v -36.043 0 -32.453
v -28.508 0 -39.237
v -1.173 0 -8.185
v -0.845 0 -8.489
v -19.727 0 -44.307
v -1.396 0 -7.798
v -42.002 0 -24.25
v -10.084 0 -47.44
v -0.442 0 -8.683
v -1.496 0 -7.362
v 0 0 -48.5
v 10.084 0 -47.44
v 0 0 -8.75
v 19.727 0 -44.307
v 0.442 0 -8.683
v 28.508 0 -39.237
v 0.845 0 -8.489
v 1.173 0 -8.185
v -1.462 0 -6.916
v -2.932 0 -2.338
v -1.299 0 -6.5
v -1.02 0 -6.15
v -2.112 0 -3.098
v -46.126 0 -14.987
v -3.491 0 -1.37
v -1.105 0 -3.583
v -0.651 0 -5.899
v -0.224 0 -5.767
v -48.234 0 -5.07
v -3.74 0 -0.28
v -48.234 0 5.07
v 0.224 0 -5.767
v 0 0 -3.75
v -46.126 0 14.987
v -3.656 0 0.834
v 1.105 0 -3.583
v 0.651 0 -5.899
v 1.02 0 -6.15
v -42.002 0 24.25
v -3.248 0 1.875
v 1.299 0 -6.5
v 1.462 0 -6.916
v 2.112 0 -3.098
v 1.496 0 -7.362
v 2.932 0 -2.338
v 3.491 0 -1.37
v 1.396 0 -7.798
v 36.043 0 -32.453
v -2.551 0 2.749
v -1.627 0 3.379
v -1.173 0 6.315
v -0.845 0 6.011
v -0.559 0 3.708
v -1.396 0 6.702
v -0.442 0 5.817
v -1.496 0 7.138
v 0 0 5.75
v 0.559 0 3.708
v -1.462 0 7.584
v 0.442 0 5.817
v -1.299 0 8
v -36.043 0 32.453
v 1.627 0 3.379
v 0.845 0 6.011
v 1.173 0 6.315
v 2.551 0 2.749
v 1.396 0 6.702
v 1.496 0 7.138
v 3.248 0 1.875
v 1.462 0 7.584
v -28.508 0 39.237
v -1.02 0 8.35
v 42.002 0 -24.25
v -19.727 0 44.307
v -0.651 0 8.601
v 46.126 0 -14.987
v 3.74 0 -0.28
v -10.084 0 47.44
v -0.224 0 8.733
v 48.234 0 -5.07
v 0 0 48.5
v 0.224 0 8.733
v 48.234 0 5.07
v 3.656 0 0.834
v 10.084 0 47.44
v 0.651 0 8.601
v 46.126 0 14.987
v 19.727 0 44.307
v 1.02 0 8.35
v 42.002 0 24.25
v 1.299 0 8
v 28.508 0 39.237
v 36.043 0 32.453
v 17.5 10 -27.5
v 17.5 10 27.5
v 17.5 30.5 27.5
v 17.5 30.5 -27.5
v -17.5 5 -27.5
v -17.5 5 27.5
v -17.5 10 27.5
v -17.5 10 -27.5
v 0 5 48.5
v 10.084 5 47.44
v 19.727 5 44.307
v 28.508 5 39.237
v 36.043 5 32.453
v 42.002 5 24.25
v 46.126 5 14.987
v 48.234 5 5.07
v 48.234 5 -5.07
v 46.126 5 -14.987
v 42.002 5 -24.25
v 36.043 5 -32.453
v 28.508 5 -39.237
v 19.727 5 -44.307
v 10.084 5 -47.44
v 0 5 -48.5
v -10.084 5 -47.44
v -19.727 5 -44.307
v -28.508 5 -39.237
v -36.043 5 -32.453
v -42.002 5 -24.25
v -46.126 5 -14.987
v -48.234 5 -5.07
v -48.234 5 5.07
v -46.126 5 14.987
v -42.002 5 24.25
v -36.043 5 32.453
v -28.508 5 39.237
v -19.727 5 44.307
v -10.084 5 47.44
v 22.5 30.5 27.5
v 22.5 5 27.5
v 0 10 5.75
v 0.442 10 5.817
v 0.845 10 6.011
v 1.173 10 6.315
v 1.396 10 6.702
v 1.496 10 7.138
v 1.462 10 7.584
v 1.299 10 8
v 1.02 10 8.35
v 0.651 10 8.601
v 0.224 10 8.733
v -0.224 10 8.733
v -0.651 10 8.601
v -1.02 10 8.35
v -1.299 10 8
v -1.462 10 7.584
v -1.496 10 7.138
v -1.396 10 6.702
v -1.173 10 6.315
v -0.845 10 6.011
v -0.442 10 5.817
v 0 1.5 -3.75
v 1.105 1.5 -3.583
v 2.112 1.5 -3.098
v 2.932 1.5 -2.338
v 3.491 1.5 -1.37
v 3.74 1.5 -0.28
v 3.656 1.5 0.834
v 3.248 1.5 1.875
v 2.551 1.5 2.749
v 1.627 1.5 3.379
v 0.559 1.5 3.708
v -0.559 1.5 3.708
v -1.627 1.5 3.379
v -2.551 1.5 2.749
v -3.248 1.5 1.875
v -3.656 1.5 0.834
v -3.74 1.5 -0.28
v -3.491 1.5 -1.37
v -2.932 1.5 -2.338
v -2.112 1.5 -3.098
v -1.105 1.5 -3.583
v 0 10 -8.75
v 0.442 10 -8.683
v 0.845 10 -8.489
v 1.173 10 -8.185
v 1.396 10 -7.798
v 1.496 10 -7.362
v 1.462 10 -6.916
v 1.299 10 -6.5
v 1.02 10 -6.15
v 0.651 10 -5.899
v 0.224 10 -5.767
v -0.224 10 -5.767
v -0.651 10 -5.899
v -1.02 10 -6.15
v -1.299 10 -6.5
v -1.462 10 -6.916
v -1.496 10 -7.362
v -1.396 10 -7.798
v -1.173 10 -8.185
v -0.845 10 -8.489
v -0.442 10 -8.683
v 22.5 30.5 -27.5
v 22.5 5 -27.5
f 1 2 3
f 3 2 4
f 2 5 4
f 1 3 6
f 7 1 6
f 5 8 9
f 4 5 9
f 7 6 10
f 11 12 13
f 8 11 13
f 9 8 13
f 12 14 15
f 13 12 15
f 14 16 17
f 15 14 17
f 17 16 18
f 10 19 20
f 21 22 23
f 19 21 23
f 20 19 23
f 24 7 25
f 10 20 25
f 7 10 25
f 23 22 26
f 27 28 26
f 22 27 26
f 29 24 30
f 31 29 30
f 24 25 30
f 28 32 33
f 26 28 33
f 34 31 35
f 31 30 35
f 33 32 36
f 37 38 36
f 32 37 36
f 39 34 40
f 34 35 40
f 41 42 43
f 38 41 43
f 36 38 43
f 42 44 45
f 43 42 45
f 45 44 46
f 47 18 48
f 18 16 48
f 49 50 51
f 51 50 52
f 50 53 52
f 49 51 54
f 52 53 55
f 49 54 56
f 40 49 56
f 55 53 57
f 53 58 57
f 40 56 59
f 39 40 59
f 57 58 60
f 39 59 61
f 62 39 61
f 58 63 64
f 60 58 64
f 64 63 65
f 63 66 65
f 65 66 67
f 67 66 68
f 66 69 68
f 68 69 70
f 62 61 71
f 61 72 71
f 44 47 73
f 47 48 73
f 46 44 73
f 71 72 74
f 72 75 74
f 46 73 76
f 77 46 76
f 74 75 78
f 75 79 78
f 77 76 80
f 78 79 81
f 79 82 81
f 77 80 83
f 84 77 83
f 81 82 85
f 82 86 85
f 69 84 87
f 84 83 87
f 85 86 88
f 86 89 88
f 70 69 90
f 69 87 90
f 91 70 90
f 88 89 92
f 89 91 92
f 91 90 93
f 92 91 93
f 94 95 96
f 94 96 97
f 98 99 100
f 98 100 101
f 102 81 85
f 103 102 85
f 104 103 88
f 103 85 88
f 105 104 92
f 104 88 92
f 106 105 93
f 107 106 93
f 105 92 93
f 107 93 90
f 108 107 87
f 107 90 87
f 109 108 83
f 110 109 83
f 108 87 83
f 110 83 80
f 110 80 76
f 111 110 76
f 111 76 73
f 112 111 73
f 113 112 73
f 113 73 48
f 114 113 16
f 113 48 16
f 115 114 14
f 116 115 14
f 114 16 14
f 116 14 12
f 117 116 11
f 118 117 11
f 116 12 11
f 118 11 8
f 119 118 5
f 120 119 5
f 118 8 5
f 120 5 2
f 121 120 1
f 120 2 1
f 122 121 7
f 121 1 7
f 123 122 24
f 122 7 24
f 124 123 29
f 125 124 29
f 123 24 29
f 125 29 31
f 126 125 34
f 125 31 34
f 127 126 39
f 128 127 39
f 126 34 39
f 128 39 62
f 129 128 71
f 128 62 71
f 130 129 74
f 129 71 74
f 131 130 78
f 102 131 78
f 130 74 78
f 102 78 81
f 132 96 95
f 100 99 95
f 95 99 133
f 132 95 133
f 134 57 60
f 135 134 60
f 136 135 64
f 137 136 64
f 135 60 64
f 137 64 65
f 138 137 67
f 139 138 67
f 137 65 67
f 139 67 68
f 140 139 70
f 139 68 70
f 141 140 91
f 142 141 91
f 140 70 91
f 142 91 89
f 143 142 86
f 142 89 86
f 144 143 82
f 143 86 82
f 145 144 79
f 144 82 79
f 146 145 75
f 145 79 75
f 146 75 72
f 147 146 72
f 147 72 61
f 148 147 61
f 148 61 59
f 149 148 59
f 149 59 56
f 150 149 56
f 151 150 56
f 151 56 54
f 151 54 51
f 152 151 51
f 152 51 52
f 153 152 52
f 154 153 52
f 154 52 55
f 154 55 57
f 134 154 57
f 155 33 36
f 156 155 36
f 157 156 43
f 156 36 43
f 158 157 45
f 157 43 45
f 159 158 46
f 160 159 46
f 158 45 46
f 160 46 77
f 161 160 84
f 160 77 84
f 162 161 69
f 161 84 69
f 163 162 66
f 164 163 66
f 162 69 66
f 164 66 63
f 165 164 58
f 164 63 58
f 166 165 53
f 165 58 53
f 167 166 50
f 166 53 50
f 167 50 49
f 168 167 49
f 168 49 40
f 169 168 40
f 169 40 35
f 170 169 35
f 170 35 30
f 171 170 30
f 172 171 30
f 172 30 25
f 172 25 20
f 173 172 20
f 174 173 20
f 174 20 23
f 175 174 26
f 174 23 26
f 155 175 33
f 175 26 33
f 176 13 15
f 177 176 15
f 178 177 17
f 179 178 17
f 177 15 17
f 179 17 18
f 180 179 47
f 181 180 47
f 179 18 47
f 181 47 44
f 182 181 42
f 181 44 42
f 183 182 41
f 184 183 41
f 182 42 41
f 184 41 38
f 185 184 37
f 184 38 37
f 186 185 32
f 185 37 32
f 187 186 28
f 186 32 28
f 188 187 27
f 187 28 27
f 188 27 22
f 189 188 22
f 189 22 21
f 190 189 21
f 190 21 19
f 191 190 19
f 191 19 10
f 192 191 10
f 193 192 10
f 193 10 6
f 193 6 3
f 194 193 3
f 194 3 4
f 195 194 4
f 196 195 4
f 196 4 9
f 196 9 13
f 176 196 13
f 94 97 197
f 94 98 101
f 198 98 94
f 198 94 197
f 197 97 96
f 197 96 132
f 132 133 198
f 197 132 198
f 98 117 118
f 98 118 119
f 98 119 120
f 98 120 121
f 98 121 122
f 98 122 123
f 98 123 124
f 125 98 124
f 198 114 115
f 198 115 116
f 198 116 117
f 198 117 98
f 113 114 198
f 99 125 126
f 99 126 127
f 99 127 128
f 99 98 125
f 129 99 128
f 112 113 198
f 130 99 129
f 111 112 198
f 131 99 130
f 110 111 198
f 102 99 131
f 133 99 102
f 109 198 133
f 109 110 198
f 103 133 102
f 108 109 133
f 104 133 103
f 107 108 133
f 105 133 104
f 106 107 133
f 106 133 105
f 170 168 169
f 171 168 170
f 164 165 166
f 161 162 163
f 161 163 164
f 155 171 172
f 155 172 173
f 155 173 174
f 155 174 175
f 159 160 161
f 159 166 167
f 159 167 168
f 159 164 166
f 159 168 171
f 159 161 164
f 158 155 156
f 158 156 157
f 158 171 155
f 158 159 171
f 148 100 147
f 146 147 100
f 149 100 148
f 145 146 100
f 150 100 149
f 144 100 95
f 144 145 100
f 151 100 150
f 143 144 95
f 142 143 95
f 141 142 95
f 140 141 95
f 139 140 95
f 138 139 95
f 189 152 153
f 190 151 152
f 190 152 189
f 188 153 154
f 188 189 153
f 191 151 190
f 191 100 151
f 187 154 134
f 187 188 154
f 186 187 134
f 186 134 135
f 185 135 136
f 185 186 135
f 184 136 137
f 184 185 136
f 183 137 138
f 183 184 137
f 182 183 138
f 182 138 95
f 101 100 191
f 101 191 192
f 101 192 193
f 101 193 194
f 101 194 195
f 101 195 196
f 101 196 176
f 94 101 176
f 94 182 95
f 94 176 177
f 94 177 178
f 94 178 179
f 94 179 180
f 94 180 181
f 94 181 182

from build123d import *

# Parameters (mm, degrees)
SKETCH2_R           = 48.5
BOSS_EXTRUDE1_DEPTH = 5
SKETCH6_W           = 35
SKETCH6_H           = 55
BOSS_EXTRUDE2_DEPTH = 5
SKETCH4_R           = 1.5
CUT_EXTRUDE2_DEPTH  = 70.314500647
SKETCH5_R           = 3.75
CUT_EXTRUDE3_DEPTH  = 1.5
SKETCH7_W           = 5
SKETCH7_H           = 55
BOSS_EXTRUDE3_DEPTH = 25.5


with BuildPart() as part:
    # Sketch2 → Boss-Extrude1 (new body)
    with BuildSketch(Plane(origin=(0, 0, 0), x_dir=(1, 0, 0), z_dir=(0, 1, 0))):
        with Locations(Location((0, 0, 0), (0, 0, 270))):
            Circle(SKETCH2_R)
    extrude(amount=BOSS_EXTRUDE1_DEPTH)

    # Sketch6 → Boss-Extrude2 (add)
    with BuildSketch(Plane(origin=(0, 5, 0), x_dir=(1, 0, 0), z_dir=(0, 1, 0))):
        Rectangle(SKETCH6_W, SKETCH6_H)
    extrude(amount=BOSS_EXTRUDE2_DEPTH)

    # Sketch4 → Cut-Extrude2 (cut, through all)
    with BuildSketch(Plane.XZ):
        with Locations(Location((0, 7.25, 0), (0, 0, 270))):
            Circle(SKETCH4_R)
        with Locations(Location((0, -7.25, 0), (0, 0, 270))):
            Circle(SKETCH4_R)
    extrude(amount=-CUT_EXTRUDE2_DEPTH, mode=Mode.SUBTRACT)

    # Sketch5 → Cut-Extrude3 (cut)
    with BuildSketch(Plane.XZ):
        with Locations(Location((0, 0, 0), (0, 0, 270))):
            Circle(SKETCH5_R)
    extrude(amount=-CUT_EXTRUDE3_DEPTH, mode=Mode.SUBTRACT)

    # Sketch7 → Boss-Extrude3 (add)
    with BuildSketch(Plane(origin=(0, 5, 0), x_dir=(1, 0, 0), z_dir=(0, 1, 0))):
        with Locations((20, 0)):
            Rectangle(SKETCH7_W, SKETCH7_H)
    extrude(amount=BOSS_EXTRUDE3_DEPTH)


solid = part.part
